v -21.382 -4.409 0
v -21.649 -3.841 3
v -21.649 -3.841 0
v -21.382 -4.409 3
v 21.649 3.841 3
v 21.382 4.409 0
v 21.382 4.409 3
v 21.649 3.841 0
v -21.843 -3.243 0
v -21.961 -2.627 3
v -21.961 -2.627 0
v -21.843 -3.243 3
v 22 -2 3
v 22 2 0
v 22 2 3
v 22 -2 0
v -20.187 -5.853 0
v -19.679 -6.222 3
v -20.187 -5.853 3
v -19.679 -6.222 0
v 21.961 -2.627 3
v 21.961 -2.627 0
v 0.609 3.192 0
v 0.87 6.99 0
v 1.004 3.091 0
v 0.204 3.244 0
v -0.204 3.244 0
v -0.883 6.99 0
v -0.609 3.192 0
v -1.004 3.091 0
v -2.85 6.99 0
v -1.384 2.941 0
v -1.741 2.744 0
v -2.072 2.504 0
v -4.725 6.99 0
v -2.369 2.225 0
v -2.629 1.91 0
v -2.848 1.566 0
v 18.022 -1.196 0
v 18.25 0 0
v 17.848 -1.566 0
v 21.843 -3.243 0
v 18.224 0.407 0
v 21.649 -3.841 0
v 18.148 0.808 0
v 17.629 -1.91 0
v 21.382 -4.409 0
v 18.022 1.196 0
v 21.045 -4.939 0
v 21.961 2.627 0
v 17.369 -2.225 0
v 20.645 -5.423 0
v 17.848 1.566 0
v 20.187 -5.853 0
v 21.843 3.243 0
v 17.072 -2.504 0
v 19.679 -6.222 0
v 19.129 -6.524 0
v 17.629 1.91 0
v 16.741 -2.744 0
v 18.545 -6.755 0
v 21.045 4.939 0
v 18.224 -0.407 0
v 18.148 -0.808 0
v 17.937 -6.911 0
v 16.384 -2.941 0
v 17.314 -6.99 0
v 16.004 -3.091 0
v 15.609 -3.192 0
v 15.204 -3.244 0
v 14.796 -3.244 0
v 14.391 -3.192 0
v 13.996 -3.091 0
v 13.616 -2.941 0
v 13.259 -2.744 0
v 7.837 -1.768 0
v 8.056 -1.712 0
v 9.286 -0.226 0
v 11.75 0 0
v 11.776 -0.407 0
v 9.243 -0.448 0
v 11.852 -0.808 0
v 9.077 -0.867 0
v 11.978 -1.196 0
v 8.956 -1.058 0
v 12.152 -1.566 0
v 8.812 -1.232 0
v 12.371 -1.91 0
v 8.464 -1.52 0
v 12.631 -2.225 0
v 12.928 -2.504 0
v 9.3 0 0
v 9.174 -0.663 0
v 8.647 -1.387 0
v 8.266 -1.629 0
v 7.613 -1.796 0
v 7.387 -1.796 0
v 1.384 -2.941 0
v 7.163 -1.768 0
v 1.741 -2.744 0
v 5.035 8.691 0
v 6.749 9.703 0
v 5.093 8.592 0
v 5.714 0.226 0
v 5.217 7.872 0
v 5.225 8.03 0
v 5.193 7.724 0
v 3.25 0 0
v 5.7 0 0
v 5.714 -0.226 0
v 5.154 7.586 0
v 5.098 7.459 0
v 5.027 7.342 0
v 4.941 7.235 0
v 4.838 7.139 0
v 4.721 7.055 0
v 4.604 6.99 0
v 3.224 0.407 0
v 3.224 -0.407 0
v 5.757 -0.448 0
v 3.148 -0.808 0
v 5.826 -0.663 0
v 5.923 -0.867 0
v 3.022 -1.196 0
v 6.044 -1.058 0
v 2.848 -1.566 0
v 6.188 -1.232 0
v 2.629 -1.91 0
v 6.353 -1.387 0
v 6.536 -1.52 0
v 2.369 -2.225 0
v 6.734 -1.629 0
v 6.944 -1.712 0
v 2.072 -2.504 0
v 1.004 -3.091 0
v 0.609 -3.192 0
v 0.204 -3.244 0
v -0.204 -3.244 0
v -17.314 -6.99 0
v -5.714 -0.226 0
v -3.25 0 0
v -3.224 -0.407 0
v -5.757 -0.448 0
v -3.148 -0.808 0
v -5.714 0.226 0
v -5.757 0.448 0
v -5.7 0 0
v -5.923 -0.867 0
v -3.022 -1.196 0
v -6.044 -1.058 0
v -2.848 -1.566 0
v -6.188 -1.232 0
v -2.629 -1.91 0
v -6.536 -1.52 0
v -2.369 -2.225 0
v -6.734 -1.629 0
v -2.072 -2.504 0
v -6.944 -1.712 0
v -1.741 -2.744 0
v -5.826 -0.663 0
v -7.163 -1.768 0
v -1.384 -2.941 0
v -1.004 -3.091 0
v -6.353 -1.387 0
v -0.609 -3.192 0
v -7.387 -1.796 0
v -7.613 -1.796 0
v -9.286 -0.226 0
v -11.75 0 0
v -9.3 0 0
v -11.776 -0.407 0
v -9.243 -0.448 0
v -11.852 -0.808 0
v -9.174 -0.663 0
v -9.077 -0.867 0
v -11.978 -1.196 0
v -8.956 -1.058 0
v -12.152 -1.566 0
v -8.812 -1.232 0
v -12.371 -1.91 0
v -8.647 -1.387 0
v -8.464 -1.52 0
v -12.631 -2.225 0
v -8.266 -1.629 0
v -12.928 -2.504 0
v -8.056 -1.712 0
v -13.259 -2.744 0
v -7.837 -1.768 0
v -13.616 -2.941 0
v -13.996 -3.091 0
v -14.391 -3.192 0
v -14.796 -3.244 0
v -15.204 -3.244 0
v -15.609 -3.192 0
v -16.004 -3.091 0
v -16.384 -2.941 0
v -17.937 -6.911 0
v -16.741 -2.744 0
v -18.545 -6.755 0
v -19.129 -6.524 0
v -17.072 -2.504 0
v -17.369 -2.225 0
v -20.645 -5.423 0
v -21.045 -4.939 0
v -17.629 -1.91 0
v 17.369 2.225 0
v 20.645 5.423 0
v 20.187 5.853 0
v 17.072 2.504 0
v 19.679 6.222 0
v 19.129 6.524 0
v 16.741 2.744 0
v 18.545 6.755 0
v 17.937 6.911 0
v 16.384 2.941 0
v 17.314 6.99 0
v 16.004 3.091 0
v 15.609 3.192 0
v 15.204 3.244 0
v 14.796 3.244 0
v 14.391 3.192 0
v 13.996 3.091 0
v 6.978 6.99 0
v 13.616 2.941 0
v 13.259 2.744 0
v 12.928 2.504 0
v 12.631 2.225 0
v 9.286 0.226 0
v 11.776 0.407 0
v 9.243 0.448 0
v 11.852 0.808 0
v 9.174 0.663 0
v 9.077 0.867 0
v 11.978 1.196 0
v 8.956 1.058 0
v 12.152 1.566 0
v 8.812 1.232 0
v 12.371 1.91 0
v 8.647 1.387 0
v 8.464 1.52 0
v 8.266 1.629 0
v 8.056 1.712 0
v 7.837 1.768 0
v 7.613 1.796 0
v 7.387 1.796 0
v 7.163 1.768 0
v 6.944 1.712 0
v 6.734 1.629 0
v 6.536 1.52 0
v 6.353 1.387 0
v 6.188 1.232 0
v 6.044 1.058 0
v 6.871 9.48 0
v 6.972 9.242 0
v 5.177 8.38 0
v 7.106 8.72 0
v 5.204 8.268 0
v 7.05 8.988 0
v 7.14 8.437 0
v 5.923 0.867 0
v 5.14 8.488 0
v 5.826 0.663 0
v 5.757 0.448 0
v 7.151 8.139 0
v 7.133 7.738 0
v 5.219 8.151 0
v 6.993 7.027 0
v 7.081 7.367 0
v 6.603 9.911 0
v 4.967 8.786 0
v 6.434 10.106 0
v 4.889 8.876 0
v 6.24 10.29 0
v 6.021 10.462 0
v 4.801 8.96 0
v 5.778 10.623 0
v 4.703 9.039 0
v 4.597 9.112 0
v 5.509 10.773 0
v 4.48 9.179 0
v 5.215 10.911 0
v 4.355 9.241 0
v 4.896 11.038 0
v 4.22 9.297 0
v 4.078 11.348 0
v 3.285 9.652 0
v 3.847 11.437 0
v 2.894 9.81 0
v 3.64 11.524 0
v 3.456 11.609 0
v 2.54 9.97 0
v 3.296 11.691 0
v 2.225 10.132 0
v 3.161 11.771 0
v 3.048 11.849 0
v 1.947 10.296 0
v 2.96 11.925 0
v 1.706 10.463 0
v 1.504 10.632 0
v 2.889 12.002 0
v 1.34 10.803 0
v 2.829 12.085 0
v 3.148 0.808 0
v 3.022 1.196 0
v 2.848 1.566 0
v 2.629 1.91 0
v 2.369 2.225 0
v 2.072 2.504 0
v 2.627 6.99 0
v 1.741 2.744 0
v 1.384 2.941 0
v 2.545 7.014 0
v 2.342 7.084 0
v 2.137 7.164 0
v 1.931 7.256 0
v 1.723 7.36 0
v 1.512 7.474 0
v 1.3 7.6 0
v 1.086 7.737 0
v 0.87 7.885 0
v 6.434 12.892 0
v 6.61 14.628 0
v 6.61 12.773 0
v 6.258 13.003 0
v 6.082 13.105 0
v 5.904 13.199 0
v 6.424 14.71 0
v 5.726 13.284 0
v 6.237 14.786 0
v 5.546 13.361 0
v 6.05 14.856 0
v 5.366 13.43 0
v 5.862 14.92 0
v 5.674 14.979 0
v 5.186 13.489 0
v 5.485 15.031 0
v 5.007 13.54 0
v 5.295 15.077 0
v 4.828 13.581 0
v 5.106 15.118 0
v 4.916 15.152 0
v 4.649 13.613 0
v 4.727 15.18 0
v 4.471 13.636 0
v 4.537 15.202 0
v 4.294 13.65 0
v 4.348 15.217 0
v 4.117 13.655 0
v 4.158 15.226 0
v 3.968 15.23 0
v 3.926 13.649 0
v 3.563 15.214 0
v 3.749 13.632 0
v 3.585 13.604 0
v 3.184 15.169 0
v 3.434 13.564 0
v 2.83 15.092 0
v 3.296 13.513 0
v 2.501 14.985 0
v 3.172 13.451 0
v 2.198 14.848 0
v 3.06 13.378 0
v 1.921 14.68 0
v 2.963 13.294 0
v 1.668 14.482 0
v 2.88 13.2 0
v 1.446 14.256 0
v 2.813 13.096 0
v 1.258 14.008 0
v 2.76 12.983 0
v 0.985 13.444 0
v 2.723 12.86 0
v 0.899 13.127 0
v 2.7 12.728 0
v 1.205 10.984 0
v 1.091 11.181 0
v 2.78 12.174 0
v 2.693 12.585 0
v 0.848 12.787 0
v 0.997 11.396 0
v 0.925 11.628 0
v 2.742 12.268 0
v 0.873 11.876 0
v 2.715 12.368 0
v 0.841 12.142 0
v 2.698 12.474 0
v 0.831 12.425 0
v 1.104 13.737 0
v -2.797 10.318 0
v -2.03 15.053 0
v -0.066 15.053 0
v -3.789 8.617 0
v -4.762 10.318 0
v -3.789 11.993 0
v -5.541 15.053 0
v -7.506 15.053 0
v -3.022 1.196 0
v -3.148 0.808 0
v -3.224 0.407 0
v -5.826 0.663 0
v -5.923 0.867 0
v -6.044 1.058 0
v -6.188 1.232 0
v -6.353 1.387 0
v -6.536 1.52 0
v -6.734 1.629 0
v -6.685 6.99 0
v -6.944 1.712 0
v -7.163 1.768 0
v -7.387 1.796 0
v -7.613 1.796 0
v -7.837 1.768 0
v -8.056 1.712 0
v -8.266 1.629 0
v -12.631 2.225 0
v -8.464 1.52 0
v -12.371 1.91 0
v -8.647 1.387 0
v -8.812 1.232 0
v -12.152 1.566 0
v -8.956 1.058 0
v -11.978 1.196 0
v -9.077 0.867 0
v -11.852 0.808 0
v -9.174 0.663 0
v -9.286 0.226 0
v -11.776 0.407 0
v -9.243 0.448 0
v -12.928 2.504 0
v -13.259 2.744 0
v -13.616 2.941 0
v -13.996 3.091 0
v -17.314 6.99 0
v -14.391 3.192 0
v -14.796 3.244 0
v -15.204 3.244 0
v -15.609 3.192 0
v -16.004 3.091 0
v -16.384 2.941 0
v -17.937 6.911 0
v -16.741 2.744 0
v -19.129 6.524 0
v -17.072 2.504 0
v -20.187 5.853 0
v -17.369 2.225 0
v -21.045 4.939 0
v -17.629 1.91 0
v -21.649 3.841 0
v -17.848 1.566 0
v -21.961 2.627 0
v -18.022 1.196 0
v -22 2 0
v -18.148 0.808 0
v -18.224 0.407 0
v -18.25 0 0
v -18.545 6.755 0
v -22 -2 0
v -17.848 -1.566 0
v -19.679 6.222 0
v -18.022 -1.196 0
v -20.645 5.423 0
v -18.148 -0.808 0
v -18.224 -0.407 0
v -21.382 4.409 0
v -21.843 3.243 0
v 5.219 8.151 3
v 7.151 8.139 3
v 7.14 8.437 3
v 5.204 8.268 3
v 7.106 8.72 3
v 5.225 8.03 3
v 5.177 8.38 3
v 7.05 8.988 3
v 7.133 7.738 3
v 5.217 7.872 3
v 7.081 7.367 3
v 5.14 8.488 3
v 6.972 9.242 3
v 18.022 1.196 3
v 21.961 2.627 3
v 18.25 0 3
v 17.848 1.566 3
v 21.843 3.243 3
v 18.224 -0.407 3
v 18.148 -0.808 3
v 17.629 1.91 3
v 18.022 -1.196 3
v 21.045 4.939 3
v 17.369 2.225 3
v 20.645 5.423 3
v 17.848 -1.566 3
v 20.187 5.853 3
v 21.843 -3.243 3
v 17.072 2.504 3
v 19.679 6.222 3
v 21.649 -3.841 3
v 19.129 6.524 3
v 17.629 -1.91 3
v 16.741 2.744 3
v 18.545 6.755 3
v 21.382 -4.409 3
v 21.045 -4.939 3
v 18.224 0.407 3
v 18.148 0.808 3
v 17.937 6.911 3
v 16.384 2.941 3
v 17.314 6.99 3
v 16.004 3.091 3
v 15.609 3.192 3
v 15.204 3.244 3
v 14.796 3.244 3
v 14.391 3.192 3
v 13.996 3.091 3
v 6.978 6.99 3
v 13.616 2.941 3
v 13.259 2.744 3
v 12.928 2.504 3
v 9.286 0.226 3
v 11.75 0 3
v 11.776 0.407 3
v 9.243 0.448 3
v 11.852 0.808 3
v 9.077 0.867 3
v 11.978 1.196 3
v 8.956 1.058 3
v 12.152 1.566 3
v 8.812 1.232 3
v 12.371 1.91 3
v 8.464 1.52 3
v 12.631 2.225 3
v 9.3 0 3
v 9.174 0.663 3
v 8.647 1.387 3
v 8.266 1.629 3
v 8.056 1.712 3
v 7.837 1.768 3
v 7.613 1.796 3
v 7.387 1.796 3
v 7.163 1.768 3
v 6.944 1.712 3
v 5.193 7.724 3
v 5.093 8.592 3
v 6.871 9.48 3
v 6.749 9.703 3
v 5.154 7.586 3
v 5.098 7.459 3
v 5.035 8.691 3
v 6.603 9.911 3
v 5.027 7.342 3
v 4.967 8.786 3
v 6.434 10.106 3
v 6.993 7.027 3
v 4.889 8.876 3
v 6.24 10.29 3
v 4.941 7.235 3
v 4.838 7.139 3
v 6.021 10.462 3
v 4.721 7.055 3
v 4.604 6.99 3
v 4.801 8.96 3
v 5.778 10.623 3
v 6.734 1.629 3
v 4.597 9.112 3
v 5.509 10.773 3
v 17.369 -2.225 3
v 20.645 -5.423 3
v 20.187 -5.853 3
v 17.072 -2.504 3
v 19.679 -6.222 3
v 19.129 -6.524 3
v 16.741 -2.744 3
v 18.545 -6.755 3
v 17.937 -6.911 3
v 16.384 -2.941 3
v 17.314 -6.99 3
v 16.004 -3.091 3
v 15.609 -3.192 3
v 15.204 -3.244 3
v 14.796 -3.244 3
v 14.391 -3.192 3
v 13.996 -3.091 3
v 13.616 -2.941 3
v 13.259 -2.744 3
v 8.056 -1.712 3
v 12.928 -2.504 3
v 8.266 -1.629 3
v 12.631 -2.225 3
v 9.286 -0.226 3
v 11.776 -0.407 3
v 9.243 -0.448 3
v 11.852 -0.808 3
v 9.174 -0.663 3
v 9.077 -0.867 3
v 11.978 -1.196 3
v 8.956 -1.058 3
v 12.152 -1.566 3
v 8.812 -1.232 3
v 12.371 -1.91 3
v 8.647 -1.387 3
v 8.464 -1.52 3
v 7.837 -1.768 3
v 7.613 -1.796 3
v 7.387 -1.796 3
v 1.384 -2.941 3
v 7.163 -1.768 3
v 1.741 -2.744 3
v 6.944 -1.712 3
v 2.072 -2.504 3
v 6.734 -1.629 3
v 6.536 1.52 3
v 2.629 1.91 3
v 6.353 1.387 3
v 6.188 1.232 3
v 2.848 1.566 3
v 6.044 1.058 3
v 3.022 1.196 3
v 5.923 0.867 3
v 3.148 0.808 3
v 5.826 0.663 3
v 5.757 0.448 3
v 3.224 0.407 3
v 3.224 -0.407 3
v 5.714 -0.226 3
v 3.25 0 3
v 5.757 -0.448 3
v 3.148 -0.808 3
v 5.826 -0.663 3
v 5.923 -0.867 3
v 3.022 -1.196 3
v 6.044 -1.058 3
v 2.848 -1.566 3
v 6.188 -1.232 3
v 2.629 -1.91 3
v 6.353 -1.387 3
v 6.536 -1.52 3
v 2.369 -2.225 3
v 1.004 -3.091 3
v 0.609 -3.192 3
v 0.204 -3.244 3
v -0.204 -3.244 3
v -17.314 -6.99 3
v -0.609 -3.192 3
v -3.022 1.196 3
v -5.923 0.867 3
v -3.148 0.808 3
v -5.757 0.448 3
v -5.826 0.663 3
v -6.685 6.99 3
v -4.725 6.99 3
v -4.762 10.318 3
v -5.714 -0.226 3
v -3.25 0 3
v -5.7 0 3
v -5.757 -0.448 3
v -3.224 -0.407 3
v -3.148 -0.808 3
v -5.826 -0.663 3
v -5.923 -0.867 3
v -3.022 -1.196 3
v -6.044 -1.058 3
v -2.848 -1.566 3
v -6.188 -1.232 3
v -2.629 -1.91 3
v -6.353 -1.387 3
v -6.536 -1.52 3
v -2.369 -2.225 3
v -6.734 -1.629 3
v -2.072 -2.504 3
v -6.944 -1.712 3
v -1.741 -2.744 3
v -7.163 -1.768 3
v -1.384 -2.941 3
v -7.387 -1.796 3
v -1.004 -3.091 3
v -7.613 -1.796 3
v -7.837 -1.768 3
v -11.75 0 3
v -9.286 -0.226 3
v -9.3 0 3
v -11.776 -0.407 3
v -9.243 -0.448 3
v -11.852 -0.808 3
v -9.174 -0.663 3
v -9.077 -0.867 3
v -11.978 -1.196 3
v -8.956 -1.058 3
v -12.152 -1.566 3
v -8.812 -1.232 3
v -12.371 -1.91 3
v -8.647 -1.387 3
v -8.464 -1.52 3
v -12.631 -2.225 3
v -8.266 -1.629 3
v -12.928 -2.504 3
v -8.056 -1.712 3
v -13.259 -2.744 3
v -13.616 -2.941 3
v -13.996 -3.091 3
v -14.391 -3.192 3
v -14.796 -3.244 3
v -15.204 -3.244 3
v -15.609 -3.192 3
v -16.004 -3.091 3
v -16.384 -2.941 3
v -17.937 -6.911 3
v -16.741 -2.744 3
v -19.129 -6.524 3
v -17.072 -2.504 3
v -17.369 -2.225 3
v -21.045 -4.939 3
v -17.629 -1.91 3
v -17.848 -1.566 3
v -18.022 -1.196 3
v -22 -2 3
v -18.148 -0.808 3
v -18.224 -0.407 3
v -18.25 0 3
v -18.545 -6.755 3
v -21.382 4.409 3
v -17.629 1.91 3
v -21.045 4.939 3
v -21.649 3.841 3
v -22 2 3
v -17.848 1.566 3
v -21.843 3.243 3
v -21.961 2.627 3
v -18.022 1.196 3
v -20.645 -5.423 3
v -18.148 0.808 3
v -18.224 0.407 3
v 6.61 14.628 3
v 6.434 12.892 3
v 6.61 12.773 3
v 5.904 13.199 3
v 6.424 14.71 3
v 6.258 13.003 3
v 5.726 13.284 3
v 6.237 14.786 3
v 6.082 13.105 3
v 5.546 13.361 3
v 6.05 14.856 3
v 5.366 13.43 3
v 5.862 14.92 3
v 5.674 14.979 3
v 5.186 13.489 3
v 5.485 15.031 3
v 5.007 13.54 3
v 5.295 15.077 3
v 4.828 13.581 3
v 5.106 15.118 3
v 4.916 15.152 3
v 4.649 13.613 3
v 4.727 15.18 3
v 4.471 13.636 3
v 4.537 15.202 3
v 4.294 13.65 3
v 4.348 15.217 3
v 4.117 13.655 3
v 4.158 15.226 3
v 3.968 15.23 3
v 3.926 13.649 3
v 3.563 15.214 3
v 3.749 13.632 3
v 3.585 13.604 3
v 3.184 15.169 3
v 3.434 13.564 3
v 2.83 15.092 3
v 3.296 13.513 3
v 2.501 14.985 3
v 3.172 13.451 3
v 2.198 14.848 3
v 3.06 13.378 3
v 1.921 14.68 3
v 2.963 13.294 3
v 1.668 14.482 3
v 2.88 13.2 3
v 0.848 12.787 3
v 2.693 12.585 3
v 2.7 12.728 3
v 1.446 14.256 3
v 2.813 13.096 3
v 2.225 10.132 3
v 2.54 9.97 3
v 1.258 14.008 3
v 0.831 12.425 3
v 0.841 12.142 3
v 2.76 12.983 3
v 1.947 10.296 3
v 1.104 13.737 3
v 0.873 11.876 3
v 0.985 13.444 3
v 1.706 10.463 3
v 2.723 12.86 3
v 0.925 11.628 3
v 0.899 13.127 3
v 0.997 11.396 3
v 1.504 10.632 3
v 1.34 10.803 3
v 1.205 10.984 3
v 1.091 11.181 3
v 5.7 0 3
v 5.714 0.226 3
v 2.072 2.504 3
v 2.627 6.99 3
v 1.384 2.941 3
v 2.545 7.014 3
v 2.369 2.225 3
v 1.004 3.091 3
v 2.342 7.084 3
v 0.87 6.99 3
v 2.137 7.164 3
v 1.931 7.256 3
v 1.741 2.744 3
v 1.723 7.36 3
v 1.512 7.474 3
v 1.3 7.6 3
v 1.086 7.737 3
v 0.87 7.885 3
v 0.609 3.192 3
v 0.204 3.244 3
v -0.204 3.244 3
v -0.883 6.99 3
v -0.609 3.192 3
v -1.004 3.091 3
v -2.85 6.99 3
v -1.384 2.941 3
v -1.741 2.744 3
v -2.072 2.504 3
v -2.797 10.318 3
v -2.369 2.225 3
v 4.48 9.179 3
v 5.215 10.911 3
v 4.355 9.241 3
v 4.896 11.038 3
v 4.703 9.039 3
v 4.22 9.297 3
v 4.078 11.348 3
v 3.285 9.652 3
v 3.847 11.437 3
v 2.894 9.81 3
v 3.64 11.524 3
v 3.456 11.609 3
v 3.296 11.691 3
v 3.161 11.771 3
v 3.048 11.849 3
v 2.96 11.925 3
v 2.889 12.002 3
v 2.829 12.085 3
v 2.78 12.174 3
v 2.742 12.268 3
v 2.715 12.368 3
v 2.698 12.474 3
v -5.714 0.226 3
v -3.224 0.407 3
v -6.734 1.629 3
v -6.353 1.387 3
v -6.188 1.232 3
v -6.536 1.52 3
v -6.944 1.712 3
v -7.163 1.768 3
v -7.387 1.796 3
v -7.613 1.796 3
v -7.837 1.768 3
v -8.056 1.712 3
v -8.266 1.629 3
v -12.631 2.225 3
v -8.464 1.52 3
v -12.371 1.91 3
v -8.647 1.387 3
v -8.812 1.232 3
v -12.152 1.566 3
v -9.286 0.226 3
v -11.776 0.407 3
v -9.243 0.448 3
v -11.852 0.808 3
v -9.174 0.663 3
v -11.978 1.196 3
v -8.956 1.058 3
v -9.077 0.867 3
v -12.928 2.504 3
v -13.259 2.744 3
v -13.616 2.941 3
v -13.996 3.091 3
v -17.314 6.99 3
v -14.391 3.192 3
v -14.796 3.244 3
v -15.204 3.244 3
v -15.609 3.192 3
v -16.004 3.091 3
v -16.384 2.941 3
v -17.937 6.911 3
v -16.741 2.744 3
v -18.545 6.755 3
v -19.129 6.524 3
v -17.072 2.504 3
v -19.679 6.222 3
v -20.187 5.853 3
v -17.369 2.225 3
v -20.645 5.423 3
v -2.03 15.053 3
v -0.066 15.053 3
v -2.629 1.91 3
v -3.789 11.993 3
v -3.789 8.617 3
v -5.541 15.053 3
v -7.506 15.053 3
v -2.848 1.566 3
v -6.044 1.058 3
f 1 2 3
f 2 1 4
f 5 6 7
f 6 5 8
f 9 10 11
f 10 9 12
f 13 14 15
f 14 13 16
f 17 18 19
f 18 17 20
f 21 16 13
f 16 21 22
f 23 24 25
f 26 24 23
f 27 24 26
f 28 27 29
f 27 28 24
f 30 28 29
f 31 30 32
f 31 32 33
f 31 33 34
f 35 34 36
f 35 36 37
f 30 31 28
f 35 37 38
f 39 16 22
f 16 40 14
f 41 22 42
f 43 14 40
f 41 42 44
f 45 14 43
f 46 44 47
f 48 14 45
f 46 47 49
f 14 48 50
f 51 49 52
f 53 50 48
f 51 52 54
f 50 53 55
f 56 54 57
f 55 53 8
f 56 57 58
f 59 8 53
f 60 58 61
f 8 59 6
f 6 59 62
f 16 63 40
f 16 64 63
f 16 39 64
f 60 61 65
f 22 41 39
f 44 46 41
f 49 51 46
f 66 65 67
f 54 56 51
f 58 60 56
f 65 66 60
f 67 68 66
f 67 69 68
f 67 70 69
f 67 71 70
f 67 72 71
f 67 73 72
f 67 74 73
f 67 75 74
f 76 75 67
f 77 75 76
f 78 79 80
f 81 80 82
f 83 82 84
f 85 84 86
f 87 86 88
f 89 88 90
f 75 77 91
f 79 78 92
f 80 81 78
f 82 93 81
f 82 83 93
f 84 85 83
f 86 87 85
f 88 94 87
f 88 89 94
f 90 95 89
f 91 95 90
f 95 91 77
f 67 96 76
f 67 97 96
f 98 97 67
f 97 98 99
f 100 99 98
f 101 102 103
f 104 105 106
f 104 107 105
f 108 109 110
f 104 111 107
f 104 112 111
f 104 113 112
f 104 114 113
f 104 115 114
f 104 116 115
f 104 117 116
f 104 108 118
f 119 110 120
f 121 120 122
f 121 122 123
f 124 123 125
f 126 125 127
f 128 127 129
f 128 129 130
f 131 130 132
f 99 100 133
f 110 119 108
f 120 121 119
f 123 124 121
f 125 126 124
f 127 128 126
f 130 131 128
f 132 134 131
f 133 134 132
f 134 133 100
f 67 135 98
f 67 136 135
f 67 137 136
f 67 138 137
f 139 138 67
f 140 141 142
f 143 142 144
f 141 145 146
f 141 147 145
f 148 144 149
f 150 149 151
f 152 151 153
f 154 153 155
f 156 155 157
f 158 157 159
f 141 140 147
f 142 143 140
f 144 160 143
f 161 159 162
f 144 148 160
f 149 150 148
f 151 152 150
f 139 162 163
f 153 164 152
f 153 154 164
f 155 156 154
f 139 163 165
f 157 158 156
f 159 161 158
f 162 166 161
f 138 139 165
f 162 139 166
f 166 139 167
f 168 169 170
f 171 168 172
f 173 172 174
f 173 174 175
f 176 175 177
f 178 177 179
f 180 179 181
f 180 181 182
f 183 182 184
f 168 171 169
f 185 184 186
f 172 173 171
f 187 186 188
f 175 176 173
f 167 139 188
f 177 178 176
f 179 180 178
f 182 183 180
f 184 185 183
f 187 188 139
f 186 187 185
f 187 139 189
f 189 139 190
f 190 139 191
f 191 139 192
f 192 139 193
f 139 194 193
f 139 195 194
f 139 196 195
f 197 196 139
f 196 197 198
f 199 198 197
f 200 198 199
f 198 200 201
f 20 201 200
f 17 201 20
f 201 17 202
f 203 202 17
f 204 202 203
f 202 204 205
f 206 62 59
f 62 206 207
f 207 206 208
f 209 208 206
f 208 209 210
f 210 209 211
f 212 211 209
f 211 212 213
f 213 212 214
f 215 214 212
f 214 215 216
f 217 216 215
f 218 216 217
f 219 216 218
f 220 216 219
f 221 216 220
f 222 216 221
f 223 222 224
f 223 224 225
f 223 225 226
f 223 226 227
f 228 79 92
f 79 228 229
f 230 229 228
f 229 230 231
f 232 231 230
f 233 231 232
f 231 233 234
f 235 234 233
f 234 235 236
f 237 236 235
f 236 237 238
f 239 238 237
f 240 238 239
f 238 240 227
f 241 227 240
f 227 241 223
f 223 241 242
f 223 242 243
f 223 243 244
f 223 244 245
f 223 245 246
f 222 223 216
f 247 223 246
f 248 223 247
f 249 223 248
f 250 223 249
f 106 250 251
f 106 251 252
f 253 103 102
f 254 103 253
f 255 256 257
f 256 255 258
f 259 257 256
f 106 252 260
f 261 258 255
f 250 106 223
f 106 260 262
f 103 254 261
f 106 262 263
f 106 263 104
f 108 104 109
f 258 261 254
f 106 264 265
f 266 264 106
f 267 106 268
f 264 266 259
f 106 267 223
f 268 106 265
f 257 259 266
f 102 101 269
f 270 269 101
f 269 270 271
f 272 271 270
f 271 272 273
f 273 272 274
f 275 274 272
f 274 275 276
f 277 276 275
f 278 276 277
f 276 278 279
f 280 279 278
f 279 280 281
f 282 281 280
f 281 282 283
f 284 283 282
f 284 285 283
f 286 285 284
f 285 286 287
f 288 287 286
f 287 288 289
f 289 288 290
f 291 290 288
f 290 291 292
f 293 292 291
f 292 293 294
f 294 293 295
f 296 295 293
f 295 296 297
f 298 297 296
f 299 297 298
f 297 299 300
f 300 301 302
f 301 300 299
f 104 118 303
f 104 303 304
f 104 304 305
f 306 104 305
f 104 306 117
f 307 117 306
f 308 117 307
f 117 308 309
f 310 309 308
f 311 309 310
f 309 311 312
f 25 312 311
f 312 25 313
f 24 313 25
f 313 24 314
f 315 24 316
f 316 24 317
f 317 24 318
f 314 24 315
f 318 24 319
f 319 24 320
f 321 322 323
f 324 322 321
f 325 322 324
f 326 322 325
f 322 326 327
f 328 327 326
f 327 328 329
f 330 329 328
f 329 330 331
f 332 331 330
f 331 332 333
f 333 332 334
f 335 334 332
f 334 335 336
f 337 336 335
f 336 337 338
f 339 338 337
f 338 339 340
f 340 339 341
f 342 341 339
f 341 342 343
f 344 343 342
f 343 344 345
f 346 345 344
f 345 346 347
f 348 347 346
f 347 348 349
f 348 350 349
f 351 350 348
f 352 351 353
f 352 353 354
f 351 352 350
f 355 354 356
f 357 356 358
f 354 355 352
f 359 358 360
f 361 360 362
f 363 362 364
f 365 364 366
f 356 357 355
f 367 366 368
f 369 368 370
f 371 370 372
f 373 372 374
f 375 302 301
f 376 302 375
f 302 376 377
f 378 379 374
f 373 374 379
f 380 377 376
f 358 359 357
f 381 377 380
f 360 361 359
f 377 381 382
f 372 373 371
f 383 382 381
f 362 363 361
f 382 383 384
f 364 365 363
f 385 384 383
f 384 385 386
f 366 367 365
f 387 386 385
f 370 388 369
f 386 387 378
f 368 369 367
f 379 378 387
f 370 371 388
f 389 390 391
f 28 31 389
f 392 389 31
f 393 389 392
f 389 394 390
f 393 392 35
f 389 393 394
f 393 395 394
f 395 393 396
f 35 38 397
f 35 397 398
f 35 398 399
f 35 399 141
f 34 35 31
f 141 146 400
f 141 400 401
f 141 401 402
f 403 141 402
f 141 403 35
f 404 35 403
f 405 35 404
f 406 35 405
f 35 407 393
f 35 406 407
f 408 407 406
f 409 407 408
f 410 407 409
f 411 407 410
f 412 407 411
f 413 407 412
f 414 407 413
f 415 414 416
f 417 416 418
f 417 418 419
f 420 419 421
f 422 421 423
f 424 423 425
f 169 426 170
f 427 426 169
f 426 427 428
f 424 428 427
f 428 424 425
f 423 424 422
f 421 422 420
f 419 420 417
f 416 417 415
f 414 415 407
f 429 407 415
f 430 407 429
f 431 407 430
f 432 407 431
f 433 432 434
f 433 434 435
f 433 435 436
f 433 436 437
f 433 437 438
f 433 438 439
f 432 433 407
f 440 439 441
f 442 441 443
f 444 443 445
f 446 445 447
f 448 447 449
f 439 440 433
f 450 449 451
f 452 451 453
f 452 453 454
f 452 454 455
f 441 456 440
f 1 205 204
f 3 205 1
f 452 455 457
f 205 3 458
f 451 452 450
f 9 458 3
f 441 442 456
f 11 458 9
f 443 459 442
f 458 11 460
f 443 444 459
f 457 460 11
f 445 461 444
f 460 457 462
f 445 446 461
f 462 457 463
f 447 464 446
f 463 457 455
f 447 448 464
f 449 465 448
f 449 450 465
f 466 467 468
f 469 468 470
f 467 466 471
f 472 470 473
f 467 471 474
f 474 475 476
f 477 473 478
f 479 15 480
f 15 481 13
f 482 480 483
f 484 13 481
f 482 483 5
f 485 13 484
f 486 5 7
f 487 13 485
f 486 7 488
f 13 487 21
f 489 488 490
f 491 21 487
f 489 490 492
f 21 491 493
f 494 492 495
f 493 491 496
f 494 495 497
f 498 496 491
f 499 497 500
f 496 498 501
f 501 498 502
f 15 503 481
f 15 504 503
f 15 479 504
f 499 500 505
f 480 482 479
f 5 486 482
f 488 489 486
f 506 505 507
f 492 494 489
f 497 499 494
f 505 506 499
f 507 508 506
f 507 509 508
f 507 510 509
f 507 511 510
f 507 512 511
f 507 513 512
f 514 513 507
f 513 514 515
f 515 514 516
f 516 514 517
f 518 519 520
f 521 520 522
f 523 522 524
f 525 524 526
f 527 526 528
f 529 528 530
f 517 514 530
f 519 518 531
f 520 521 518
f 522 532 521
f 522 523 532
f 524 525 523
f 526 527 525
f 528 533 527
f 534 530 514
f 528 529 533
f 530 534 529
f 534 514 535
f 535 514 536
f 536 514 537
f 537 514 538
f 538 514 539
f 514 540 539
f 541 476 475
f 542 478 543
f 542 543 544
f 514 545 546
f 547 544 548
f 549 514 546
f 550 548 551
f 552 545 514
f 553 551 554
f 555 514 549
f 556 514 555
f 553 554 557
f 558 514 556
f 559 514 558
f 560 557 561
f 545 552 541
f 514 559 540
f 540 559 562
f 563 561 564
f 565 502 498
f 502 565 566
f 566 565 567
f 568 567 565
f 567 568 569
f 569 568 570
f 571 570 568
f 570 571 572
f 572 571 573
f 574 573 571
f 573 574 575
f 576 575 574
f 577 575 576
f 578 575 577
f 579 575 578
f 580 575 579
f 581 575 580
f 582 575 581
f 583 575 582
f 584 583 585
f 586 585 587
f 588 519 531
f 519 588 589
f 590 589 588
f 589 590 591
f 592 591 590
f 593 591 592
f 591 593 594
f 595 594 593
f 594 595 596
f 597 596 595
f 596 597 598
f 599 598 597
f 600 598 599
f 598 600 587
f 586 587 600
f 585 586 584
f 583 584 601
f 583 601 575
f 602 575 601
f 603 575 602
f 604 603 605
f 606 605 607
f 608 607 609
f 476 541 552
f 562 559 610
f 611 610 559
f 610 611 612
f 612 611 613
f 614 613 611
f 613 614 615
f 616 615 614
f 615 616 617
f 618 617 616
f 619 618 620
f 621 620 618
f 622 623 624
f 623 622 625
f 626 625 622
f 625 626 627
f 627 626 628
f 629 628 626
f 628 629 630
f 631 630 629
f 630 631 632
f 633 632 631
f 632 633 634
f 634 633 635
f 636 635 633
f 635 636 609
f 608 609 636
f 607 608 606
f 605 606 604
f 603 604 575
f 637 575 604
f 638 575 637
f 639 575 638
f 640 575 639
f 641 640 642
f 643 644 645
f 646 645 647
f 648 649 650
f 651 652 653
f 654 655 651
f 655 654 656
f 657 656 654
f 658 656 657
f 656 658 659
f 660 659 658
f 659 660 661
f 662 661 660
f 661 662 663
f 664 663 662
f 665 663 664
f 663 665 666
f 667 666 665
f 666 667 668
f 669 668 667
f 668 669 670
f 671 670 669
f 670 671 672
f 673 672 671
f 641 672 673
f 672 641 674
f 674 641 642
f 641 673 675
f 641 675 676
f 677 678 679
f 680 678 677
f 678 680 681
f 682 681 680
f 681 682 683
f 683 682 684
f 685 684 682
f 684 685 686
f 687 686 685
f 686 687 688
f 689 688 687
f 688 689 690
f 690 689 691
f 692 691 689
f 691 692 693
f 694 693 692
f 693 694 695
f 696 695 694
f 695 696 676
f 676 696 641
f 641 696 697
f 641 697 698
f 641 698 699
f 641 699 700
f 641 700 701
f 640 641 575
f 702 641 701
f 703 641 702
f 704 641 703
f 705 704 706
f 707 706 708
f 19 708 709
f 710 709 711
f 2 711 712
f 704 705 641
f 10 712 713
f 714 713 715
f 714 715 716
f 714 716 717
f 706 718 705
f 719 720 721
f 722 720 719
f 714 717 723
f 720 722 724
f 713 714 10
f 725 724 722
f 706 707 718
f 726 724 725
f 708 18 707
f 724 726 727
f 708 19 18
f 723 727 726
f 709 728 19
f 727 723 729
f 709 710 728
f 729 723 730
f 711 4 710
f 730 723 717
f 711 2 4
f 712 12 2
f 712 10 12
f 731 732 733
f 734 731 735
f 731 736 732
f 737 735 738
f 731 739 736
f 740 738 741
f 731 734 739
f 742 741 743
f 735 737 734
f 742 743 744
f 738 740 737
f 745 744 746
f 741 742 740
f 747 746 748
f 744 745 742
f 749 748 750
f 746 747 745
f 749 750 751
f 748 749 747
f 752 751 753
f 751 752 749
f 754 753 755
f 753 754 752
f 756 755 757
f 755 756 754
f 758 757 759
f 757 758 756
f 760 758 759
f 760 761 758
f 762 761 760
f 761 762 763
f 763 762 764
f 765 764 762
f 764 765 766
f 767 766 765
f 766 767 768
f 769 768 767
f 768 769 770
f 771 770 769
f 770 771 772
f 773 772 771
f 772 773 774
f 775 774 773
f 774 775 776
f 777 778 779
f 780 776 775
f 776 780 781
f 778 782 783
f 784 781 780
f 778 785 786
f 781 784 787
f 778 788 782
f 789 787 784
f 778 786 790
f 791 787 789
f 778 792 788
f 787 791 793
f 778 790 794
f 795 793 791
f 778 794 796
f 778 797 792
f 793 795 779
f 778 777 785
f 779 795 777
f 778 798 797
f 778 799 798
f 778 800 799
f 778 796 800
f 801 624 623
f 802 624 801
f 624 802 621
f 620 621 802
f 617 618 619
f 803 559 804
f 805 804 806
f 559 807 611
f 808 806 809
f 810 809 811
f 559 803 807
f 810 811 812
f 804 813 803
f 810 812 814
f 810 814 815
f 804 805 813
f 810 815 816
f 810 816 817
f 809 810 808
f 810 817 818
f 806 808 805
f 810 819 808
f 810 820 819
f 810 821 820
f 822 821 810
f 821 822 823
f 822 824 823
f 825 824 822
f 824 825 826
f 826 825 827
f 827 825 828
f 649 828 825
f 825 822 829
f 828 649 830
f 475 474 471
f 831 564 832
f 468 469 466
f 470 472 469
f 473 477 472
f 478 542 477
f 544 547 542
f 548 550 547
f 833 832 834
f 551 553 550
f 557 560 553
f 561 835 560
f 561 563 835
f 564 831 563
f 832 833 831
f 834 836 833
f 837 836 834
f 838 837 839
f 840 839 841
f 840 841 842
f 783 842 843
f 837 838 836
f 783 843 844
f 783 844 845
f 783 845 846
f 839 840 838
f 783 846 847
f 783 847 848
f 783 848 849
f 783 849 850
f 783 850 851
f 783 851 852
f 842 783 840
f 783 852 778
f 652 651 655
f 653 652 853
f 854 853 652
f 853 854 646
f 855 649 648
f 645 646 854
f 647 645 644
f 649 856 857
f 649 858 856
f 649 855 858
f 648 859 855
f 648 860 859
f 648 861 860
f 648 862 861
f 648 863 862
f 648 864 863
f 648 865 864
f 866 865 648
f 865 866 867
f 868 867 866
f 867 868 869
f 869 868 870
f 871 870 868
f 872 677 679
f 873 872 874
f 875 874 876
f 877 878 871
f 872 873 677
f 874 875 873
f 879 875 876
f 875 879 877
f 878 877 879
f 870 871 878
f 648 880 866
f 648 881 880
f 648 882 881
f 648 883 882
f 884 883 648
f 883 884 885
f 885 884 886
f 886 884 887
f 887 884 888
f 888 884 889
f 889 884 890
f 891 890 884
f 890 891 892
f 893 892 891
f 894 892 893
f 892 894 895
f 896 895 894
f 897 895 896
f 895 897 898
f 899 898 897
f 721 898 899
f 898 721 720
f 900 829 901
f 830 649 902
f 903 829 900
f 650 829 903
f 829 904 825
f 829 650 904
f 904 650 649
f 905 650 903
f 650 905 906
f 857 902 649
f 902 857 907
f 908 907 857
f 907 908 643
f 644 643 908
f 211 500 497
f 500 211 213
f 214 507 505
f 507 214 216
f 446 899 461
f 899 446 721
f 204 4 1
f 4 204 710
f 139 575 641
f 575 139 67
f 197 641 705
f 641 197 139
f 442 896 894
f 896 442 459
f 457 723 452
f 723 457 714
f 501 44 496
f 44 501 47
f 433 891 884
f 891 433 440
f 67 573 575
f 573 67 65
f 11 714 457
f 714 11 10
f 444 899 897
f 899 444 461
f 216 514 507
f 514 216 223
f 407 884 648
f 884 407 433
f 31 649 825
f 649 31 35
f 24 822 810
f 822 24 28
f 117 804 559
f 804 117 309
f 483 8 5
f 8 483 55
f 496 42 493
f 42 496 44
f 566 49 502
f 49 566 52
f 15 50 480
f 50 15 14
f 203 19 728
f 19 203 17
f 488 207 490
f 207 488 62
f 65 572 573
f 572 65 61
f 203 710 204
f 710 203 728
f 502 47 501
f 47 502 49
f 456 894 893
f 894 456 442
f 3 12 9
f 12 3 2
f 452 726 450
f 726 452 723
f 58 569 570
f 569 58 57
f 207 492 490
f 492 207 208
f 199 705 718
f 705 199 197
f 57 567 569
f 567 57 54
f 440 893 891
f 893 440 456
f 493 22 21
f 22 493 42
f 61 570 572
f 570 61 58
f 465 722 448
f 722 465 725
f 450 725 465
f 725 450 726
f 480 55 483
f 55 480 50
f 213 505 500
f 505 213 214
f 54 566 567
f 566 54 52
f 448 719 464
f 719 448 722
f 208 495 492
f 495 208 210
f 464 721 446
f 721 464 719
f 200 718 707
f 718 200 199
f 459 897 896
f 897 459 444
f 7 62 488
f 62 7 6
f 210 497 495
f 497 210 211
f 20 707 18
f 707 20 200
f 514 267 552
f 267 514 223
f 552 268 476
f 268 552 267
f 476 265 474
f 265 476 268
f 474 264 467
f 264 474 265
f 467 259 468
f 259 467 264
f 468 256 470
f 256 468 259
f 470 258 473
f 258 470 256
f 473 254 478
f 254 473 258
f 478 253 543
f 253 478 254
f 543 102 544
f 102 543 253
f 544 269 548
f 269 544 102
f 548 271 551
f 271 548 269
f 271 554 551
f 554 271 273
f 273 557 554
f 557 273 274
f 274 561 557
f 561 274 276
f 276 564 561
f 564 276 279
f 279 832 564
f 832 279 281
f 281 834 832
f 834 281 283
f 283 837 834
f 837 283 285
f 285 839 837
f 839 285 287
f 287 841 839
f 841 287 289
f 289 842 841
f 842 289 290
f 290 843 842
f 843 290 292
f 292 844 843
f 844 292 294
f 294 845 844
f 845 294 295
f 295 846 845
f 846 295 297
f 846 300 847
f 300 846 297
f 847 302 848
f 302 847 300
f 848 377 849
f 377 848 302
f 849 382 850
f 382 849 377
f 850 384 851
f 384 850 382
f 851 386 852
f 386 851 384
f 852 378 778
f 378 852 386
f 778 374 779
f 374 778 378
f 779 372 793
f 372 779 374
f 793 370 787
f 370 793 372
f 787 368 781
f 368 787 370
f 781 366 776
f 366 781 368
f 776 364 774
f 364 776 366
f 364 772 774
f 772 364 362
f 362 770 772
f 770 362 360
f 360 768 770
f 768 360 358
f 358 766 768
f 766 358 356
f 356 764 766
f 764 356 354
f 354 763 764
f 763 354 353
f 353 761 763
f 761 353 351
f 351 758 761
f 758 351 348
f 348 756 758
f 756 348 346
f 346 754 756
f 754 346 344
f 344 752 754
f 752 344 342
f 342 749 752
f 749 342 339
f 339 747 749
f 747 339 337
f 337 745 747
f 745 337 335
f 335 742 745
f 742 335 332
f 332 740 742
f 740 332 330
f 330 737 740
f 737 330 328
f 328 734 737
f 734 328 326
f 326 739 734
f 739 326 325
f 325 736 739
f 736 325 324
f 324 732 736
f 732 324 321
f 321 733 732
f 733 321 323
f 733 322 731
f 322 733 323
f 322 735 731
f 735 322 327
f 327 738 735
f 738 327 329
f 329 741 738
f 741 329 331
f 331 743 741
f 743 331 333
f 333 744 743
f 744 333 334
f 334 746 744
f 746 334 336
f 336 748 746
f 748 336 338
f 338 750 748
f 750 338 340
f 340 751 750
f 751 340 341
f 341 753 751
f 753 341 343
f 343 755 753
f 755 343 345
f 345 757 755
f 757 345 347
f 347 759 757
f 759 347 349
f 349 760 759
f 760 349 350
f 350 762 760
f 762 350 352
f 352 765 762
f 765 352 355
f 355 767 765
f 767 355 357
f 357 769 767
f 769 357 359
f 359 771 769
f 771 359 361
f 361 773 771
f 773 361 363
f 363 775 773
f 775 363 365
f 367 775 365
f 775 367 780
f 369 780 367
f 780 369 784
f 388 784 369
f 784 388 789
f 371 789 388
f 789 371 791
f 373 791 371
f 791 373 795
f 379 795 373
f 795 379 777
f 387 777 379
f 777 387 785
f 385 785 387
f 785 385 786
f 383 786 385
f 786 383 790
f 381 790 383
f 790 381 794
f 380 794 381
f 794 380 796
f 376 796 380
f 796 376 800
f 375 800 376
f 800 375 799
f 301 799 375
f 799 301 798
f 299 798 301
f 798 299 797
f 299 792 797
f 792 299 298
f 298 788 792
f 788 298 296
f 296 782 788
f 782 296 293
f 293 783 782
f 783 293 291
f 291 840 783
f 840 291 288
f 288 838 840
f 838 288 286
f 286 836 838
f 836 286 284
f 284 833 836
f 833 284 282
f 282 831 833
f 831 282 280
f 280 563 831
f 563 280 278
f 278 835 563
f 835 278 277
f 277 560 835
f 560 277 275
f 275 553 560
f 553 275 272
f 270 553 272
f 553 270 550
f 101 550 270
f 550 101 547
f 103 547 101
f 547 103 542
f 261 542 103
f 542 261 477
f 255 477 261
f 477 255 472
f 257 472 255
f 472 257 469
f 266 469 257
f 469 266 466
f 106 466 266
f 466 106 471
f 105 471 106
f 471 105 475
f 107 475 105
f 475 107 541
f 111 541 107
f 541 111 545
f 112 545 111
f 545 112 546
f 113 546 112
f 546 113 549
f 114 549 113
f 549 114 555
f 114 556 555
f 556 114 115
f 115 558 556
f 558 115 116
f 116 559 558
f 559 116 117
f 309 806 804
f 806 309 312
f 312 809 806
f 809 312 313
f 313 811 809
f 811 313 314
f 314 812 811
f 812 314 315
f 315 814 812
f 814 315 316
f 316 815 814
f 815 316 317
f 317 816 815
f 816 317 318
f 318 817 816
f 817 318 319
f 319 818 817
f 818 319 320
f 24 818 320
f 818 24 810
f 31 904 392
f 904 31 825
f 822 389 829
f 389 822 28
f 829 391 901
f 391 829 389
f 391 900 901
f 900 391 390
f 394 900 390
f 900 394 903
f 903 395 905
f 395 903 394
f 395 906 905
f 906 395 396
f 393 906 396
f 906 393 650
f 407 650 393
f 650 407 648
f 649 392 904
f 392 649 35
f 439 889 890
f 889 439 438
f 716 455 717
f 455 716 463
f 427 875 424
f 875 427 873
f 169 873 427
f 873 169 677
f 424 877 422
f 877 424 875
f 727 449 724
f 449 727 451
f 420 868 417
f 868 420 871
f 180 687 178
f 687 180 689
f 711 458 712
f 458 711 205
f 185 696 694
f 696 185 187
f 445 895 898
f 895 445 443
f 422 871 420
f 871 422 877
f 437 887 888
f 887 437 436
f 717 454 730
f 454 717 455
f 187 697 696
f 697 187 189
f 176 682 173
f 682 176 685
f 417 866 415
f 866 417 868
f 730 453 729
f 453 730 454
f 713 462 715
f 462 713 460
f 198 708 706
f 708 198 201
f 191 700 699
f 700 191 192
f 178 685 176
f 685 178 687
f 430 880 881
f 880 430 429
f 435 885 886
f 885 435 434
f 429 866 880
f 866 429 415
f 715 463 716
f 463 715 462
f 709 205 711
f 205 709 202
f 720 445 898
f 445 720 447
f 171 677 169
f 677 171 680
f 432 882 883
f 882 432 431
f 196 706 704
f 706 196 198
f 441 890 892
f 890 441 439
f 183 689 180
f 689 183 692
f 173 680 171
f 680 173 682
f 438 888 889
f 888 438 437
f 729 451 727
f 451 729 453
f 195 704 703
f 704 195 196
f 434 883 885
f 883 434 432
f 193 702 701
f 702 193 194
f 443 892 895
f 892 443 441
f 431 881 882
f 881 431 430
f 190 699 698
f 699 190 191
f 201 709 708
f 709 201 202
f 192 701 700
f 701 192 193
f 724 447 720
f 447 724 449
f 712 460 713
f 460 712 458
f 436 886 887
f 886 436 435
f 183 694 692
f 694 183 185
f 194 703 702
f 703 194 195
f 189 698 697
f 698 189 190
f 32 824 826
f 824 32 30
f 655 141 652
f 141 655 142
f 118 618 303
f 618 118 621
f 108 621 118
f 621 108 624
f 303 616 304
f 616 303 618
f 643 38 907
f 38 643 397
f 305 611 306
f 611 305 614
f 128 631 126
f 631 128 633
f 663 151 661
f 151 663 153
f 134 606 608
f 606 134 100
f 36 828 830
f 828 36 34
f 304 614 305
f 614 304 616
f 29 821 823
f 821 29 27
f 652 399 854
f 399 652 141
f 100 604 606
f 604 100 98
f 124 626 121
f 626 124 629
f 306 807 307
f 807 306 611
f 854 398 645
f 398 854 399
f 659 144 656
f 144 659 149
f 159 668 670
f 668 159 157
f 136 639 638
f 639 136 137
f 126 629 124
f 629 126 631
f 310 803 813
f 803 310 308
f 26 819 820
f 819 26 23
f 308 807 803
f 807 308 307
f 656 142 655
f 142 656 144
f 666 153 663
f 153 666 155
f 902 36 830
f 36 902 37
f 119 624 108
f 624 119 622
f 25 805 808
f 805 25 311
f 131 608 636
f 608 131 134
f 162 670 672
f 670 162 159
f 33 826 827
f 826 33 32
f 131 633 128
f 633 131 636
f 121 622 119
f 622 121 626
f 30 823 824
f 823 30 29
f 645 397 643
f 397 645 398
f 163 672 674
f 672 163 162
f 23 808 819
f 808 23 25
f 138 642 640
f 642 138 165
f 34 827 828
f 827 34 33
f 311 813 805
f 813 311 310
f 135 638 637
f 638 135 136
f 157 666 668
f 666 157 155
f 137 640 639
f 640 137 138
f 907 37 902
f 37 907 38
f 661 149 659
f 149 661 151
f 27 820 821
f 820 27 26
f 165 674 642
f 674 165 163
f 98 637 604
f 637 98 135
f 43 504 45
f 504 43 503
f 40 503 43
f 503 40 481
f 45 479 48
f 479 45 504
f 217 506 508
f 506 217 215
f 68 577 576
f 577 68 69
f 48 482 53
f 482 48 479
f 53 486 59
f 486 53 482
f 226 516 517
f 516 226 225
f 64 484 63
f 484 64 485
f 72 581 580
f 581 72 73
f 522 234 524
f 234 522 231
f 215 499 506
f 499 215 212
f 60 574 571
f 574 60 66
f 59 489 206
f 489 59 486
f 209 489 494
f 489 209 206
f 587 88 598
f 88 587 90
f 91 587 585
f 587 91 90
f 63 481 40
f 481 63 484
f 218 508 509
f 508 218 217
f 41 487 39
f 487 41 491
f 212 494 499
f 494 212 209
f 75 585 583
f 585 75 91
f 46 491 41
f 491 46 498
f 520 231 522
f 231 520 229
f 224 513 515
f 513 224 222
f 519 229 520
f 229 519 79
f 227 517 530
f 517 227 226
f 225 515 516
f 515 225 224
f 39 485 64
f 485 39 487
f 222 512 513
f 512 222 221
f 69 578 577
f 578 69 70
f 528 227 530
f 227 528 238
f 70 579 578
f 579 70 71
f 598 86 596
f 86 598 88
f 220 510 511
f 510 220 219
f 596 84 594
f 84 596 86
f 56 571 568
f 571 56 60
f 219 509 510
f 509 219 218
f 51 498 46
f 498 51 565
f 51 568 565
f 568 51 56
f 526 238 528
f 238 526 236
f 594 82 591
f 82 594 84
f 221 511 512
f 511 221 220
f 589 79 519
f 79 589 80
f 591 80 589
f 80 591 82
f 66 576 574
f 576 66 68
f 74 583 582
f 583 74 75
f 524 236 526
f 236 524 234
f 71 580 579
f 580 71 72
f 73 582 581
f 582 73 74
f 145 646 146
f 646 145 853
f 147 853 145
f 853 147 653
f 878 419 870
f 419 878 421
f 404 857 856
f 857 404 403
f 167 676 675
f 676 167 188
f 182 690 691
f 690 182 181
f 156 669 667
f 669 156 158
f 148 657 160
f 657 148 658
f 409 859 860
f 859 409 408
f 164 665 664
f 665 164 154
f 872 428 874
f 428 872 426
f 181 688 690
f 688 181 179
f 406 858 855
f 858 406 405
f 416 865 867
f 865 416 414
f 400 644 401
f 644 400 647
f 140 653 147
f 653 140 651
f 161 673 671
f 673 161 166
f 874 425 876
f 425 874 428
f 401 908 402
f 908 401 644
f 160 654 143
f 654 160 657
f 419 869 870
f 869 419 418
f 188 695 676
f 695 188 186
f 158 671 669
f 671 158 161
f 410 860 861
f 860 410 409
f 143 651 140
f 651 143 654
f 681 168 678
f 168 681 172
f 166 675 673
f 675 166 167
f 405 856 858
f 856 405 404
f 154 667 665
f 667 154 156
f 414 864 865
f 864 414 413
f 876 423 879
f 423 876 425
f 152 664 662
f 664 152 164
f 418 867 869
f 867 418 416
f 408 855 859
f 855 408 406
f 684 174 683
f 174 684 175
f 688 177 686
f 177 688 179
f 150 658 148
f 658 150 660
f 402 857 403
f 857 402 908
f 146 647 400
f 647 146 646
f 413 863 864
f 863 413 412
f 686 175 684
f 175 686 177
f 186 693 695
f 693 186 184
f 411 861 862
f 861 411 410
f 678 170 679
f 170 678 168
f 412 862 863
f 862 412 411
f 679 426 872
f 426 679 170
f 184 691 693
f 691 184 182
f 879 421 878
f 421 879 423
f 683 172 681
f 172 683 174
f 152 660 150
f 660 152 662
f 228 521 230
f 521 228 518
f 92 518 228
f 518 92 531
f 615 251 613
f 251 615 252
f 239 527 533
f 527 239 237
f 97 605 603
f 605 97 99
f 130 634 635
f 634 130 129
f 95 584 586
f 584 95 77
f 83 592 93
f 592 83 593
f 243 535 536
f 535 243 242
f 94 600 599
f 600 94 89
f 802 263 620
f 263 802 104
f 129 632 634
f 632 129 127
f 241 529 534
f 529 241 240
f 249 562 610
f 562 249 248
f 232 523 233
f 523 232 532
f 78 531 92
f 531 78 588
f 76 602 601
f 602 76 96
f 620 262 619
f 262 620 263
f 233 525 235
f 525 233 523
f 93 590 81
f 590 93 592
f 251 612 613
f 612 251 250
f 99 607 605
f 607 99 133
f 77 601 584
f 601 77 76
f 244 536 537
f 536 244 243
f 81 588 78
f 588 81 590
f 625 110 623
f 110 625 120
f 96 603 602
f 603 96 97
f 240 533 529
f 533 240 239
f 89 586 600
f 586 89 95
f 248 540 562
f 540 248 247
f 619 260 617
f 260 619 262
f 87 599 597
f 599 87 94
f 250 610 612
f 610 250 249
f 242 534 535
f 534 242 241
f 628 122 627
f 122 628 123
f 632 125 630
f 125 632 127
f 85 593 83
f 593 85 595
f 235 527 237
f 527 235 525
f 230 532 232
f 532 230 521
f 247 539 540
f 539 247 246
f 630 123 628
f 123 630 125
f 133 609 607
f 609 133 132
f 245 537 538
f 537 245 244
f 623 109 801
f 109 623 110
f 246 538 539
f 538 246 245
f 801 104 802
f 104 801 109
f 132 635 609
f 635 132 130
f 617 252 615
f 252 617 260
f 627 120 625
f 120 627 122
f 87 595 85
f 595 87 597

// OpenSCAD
$fn = 50;


difference() {
	union() {
		hull() {
			translate(v = [-17.0000000000, 2.0000000000, 0]) {
				cylinder(h = 3, r = 5);
			}
			translate(v = [17.0000000000, 2.0000000000, 0]) {
				cylinder(h = 3, r = 5);
			}
			translate(v = [-17.0000000000, -2.0000000000, 0]) {
				cylinder(h = 3, r = 5);
			}
			translate(v = [17.0000000000, -2.0000000000, 0]) {
				cylinder(h = 3, r = 5);
			}
		}
		translate(v = [0, 15.0000000000, 0]) {
			linear_extrude(height = 3) {
				text(font = "DejaVu Sans Mono:style=Bold", halign = "center", size = 9.5000000000, text = "XS", valign = "top");
			}
		}
	}
	union() {
		translate(v = [-15.0000000000, 0.0000000000, 0]) {
			translate(v = [0, 0, -100]) {
				cylinder(h = 200, r = 3.2500000000);
			}
		}
		translate(v = [0, 0, -100]) {
			cylinder(h = 200, r = 3.2500000000);
		}
		translate(v = [15.0000000000, 0.0000000000, 0]) {
			translate(v = [0, 0, -100]) {
				cylinder(h = 200, r = 3.2500000000);
			}
		}
		translate(v = [-15.0000000000, 0.0000000000, 0]) {
			translate(v = [0, 0, -100]) {
				cylinder(h = 200, r = 1.8000000000);
			}
		}
		translate(v = [-7.5000000000, 0.0000000000, 0]) {
			translate(v = [0, 0, -100]) {
				cylinder(h = 200, r = 1.8000000000);
			}
		}
		translate(v = [0, 0, -100]) {
			cylinder(h = 200, r = 1.8000000000);
		}
		translate(v = [7.5000000000, 0.0000000000, 0]) {
			translate(v = [0, 0, -100]) {
				cylinder(h = 200, r = 1.8000000000);
			}
		}
		translate(v = [15.0000000000, 0.0000000000, 0]) {
			translate(v = [0, 0, -100]) {
				cylinder(h = 200, r = 1.8000000000);
			}
		}
	}
}
